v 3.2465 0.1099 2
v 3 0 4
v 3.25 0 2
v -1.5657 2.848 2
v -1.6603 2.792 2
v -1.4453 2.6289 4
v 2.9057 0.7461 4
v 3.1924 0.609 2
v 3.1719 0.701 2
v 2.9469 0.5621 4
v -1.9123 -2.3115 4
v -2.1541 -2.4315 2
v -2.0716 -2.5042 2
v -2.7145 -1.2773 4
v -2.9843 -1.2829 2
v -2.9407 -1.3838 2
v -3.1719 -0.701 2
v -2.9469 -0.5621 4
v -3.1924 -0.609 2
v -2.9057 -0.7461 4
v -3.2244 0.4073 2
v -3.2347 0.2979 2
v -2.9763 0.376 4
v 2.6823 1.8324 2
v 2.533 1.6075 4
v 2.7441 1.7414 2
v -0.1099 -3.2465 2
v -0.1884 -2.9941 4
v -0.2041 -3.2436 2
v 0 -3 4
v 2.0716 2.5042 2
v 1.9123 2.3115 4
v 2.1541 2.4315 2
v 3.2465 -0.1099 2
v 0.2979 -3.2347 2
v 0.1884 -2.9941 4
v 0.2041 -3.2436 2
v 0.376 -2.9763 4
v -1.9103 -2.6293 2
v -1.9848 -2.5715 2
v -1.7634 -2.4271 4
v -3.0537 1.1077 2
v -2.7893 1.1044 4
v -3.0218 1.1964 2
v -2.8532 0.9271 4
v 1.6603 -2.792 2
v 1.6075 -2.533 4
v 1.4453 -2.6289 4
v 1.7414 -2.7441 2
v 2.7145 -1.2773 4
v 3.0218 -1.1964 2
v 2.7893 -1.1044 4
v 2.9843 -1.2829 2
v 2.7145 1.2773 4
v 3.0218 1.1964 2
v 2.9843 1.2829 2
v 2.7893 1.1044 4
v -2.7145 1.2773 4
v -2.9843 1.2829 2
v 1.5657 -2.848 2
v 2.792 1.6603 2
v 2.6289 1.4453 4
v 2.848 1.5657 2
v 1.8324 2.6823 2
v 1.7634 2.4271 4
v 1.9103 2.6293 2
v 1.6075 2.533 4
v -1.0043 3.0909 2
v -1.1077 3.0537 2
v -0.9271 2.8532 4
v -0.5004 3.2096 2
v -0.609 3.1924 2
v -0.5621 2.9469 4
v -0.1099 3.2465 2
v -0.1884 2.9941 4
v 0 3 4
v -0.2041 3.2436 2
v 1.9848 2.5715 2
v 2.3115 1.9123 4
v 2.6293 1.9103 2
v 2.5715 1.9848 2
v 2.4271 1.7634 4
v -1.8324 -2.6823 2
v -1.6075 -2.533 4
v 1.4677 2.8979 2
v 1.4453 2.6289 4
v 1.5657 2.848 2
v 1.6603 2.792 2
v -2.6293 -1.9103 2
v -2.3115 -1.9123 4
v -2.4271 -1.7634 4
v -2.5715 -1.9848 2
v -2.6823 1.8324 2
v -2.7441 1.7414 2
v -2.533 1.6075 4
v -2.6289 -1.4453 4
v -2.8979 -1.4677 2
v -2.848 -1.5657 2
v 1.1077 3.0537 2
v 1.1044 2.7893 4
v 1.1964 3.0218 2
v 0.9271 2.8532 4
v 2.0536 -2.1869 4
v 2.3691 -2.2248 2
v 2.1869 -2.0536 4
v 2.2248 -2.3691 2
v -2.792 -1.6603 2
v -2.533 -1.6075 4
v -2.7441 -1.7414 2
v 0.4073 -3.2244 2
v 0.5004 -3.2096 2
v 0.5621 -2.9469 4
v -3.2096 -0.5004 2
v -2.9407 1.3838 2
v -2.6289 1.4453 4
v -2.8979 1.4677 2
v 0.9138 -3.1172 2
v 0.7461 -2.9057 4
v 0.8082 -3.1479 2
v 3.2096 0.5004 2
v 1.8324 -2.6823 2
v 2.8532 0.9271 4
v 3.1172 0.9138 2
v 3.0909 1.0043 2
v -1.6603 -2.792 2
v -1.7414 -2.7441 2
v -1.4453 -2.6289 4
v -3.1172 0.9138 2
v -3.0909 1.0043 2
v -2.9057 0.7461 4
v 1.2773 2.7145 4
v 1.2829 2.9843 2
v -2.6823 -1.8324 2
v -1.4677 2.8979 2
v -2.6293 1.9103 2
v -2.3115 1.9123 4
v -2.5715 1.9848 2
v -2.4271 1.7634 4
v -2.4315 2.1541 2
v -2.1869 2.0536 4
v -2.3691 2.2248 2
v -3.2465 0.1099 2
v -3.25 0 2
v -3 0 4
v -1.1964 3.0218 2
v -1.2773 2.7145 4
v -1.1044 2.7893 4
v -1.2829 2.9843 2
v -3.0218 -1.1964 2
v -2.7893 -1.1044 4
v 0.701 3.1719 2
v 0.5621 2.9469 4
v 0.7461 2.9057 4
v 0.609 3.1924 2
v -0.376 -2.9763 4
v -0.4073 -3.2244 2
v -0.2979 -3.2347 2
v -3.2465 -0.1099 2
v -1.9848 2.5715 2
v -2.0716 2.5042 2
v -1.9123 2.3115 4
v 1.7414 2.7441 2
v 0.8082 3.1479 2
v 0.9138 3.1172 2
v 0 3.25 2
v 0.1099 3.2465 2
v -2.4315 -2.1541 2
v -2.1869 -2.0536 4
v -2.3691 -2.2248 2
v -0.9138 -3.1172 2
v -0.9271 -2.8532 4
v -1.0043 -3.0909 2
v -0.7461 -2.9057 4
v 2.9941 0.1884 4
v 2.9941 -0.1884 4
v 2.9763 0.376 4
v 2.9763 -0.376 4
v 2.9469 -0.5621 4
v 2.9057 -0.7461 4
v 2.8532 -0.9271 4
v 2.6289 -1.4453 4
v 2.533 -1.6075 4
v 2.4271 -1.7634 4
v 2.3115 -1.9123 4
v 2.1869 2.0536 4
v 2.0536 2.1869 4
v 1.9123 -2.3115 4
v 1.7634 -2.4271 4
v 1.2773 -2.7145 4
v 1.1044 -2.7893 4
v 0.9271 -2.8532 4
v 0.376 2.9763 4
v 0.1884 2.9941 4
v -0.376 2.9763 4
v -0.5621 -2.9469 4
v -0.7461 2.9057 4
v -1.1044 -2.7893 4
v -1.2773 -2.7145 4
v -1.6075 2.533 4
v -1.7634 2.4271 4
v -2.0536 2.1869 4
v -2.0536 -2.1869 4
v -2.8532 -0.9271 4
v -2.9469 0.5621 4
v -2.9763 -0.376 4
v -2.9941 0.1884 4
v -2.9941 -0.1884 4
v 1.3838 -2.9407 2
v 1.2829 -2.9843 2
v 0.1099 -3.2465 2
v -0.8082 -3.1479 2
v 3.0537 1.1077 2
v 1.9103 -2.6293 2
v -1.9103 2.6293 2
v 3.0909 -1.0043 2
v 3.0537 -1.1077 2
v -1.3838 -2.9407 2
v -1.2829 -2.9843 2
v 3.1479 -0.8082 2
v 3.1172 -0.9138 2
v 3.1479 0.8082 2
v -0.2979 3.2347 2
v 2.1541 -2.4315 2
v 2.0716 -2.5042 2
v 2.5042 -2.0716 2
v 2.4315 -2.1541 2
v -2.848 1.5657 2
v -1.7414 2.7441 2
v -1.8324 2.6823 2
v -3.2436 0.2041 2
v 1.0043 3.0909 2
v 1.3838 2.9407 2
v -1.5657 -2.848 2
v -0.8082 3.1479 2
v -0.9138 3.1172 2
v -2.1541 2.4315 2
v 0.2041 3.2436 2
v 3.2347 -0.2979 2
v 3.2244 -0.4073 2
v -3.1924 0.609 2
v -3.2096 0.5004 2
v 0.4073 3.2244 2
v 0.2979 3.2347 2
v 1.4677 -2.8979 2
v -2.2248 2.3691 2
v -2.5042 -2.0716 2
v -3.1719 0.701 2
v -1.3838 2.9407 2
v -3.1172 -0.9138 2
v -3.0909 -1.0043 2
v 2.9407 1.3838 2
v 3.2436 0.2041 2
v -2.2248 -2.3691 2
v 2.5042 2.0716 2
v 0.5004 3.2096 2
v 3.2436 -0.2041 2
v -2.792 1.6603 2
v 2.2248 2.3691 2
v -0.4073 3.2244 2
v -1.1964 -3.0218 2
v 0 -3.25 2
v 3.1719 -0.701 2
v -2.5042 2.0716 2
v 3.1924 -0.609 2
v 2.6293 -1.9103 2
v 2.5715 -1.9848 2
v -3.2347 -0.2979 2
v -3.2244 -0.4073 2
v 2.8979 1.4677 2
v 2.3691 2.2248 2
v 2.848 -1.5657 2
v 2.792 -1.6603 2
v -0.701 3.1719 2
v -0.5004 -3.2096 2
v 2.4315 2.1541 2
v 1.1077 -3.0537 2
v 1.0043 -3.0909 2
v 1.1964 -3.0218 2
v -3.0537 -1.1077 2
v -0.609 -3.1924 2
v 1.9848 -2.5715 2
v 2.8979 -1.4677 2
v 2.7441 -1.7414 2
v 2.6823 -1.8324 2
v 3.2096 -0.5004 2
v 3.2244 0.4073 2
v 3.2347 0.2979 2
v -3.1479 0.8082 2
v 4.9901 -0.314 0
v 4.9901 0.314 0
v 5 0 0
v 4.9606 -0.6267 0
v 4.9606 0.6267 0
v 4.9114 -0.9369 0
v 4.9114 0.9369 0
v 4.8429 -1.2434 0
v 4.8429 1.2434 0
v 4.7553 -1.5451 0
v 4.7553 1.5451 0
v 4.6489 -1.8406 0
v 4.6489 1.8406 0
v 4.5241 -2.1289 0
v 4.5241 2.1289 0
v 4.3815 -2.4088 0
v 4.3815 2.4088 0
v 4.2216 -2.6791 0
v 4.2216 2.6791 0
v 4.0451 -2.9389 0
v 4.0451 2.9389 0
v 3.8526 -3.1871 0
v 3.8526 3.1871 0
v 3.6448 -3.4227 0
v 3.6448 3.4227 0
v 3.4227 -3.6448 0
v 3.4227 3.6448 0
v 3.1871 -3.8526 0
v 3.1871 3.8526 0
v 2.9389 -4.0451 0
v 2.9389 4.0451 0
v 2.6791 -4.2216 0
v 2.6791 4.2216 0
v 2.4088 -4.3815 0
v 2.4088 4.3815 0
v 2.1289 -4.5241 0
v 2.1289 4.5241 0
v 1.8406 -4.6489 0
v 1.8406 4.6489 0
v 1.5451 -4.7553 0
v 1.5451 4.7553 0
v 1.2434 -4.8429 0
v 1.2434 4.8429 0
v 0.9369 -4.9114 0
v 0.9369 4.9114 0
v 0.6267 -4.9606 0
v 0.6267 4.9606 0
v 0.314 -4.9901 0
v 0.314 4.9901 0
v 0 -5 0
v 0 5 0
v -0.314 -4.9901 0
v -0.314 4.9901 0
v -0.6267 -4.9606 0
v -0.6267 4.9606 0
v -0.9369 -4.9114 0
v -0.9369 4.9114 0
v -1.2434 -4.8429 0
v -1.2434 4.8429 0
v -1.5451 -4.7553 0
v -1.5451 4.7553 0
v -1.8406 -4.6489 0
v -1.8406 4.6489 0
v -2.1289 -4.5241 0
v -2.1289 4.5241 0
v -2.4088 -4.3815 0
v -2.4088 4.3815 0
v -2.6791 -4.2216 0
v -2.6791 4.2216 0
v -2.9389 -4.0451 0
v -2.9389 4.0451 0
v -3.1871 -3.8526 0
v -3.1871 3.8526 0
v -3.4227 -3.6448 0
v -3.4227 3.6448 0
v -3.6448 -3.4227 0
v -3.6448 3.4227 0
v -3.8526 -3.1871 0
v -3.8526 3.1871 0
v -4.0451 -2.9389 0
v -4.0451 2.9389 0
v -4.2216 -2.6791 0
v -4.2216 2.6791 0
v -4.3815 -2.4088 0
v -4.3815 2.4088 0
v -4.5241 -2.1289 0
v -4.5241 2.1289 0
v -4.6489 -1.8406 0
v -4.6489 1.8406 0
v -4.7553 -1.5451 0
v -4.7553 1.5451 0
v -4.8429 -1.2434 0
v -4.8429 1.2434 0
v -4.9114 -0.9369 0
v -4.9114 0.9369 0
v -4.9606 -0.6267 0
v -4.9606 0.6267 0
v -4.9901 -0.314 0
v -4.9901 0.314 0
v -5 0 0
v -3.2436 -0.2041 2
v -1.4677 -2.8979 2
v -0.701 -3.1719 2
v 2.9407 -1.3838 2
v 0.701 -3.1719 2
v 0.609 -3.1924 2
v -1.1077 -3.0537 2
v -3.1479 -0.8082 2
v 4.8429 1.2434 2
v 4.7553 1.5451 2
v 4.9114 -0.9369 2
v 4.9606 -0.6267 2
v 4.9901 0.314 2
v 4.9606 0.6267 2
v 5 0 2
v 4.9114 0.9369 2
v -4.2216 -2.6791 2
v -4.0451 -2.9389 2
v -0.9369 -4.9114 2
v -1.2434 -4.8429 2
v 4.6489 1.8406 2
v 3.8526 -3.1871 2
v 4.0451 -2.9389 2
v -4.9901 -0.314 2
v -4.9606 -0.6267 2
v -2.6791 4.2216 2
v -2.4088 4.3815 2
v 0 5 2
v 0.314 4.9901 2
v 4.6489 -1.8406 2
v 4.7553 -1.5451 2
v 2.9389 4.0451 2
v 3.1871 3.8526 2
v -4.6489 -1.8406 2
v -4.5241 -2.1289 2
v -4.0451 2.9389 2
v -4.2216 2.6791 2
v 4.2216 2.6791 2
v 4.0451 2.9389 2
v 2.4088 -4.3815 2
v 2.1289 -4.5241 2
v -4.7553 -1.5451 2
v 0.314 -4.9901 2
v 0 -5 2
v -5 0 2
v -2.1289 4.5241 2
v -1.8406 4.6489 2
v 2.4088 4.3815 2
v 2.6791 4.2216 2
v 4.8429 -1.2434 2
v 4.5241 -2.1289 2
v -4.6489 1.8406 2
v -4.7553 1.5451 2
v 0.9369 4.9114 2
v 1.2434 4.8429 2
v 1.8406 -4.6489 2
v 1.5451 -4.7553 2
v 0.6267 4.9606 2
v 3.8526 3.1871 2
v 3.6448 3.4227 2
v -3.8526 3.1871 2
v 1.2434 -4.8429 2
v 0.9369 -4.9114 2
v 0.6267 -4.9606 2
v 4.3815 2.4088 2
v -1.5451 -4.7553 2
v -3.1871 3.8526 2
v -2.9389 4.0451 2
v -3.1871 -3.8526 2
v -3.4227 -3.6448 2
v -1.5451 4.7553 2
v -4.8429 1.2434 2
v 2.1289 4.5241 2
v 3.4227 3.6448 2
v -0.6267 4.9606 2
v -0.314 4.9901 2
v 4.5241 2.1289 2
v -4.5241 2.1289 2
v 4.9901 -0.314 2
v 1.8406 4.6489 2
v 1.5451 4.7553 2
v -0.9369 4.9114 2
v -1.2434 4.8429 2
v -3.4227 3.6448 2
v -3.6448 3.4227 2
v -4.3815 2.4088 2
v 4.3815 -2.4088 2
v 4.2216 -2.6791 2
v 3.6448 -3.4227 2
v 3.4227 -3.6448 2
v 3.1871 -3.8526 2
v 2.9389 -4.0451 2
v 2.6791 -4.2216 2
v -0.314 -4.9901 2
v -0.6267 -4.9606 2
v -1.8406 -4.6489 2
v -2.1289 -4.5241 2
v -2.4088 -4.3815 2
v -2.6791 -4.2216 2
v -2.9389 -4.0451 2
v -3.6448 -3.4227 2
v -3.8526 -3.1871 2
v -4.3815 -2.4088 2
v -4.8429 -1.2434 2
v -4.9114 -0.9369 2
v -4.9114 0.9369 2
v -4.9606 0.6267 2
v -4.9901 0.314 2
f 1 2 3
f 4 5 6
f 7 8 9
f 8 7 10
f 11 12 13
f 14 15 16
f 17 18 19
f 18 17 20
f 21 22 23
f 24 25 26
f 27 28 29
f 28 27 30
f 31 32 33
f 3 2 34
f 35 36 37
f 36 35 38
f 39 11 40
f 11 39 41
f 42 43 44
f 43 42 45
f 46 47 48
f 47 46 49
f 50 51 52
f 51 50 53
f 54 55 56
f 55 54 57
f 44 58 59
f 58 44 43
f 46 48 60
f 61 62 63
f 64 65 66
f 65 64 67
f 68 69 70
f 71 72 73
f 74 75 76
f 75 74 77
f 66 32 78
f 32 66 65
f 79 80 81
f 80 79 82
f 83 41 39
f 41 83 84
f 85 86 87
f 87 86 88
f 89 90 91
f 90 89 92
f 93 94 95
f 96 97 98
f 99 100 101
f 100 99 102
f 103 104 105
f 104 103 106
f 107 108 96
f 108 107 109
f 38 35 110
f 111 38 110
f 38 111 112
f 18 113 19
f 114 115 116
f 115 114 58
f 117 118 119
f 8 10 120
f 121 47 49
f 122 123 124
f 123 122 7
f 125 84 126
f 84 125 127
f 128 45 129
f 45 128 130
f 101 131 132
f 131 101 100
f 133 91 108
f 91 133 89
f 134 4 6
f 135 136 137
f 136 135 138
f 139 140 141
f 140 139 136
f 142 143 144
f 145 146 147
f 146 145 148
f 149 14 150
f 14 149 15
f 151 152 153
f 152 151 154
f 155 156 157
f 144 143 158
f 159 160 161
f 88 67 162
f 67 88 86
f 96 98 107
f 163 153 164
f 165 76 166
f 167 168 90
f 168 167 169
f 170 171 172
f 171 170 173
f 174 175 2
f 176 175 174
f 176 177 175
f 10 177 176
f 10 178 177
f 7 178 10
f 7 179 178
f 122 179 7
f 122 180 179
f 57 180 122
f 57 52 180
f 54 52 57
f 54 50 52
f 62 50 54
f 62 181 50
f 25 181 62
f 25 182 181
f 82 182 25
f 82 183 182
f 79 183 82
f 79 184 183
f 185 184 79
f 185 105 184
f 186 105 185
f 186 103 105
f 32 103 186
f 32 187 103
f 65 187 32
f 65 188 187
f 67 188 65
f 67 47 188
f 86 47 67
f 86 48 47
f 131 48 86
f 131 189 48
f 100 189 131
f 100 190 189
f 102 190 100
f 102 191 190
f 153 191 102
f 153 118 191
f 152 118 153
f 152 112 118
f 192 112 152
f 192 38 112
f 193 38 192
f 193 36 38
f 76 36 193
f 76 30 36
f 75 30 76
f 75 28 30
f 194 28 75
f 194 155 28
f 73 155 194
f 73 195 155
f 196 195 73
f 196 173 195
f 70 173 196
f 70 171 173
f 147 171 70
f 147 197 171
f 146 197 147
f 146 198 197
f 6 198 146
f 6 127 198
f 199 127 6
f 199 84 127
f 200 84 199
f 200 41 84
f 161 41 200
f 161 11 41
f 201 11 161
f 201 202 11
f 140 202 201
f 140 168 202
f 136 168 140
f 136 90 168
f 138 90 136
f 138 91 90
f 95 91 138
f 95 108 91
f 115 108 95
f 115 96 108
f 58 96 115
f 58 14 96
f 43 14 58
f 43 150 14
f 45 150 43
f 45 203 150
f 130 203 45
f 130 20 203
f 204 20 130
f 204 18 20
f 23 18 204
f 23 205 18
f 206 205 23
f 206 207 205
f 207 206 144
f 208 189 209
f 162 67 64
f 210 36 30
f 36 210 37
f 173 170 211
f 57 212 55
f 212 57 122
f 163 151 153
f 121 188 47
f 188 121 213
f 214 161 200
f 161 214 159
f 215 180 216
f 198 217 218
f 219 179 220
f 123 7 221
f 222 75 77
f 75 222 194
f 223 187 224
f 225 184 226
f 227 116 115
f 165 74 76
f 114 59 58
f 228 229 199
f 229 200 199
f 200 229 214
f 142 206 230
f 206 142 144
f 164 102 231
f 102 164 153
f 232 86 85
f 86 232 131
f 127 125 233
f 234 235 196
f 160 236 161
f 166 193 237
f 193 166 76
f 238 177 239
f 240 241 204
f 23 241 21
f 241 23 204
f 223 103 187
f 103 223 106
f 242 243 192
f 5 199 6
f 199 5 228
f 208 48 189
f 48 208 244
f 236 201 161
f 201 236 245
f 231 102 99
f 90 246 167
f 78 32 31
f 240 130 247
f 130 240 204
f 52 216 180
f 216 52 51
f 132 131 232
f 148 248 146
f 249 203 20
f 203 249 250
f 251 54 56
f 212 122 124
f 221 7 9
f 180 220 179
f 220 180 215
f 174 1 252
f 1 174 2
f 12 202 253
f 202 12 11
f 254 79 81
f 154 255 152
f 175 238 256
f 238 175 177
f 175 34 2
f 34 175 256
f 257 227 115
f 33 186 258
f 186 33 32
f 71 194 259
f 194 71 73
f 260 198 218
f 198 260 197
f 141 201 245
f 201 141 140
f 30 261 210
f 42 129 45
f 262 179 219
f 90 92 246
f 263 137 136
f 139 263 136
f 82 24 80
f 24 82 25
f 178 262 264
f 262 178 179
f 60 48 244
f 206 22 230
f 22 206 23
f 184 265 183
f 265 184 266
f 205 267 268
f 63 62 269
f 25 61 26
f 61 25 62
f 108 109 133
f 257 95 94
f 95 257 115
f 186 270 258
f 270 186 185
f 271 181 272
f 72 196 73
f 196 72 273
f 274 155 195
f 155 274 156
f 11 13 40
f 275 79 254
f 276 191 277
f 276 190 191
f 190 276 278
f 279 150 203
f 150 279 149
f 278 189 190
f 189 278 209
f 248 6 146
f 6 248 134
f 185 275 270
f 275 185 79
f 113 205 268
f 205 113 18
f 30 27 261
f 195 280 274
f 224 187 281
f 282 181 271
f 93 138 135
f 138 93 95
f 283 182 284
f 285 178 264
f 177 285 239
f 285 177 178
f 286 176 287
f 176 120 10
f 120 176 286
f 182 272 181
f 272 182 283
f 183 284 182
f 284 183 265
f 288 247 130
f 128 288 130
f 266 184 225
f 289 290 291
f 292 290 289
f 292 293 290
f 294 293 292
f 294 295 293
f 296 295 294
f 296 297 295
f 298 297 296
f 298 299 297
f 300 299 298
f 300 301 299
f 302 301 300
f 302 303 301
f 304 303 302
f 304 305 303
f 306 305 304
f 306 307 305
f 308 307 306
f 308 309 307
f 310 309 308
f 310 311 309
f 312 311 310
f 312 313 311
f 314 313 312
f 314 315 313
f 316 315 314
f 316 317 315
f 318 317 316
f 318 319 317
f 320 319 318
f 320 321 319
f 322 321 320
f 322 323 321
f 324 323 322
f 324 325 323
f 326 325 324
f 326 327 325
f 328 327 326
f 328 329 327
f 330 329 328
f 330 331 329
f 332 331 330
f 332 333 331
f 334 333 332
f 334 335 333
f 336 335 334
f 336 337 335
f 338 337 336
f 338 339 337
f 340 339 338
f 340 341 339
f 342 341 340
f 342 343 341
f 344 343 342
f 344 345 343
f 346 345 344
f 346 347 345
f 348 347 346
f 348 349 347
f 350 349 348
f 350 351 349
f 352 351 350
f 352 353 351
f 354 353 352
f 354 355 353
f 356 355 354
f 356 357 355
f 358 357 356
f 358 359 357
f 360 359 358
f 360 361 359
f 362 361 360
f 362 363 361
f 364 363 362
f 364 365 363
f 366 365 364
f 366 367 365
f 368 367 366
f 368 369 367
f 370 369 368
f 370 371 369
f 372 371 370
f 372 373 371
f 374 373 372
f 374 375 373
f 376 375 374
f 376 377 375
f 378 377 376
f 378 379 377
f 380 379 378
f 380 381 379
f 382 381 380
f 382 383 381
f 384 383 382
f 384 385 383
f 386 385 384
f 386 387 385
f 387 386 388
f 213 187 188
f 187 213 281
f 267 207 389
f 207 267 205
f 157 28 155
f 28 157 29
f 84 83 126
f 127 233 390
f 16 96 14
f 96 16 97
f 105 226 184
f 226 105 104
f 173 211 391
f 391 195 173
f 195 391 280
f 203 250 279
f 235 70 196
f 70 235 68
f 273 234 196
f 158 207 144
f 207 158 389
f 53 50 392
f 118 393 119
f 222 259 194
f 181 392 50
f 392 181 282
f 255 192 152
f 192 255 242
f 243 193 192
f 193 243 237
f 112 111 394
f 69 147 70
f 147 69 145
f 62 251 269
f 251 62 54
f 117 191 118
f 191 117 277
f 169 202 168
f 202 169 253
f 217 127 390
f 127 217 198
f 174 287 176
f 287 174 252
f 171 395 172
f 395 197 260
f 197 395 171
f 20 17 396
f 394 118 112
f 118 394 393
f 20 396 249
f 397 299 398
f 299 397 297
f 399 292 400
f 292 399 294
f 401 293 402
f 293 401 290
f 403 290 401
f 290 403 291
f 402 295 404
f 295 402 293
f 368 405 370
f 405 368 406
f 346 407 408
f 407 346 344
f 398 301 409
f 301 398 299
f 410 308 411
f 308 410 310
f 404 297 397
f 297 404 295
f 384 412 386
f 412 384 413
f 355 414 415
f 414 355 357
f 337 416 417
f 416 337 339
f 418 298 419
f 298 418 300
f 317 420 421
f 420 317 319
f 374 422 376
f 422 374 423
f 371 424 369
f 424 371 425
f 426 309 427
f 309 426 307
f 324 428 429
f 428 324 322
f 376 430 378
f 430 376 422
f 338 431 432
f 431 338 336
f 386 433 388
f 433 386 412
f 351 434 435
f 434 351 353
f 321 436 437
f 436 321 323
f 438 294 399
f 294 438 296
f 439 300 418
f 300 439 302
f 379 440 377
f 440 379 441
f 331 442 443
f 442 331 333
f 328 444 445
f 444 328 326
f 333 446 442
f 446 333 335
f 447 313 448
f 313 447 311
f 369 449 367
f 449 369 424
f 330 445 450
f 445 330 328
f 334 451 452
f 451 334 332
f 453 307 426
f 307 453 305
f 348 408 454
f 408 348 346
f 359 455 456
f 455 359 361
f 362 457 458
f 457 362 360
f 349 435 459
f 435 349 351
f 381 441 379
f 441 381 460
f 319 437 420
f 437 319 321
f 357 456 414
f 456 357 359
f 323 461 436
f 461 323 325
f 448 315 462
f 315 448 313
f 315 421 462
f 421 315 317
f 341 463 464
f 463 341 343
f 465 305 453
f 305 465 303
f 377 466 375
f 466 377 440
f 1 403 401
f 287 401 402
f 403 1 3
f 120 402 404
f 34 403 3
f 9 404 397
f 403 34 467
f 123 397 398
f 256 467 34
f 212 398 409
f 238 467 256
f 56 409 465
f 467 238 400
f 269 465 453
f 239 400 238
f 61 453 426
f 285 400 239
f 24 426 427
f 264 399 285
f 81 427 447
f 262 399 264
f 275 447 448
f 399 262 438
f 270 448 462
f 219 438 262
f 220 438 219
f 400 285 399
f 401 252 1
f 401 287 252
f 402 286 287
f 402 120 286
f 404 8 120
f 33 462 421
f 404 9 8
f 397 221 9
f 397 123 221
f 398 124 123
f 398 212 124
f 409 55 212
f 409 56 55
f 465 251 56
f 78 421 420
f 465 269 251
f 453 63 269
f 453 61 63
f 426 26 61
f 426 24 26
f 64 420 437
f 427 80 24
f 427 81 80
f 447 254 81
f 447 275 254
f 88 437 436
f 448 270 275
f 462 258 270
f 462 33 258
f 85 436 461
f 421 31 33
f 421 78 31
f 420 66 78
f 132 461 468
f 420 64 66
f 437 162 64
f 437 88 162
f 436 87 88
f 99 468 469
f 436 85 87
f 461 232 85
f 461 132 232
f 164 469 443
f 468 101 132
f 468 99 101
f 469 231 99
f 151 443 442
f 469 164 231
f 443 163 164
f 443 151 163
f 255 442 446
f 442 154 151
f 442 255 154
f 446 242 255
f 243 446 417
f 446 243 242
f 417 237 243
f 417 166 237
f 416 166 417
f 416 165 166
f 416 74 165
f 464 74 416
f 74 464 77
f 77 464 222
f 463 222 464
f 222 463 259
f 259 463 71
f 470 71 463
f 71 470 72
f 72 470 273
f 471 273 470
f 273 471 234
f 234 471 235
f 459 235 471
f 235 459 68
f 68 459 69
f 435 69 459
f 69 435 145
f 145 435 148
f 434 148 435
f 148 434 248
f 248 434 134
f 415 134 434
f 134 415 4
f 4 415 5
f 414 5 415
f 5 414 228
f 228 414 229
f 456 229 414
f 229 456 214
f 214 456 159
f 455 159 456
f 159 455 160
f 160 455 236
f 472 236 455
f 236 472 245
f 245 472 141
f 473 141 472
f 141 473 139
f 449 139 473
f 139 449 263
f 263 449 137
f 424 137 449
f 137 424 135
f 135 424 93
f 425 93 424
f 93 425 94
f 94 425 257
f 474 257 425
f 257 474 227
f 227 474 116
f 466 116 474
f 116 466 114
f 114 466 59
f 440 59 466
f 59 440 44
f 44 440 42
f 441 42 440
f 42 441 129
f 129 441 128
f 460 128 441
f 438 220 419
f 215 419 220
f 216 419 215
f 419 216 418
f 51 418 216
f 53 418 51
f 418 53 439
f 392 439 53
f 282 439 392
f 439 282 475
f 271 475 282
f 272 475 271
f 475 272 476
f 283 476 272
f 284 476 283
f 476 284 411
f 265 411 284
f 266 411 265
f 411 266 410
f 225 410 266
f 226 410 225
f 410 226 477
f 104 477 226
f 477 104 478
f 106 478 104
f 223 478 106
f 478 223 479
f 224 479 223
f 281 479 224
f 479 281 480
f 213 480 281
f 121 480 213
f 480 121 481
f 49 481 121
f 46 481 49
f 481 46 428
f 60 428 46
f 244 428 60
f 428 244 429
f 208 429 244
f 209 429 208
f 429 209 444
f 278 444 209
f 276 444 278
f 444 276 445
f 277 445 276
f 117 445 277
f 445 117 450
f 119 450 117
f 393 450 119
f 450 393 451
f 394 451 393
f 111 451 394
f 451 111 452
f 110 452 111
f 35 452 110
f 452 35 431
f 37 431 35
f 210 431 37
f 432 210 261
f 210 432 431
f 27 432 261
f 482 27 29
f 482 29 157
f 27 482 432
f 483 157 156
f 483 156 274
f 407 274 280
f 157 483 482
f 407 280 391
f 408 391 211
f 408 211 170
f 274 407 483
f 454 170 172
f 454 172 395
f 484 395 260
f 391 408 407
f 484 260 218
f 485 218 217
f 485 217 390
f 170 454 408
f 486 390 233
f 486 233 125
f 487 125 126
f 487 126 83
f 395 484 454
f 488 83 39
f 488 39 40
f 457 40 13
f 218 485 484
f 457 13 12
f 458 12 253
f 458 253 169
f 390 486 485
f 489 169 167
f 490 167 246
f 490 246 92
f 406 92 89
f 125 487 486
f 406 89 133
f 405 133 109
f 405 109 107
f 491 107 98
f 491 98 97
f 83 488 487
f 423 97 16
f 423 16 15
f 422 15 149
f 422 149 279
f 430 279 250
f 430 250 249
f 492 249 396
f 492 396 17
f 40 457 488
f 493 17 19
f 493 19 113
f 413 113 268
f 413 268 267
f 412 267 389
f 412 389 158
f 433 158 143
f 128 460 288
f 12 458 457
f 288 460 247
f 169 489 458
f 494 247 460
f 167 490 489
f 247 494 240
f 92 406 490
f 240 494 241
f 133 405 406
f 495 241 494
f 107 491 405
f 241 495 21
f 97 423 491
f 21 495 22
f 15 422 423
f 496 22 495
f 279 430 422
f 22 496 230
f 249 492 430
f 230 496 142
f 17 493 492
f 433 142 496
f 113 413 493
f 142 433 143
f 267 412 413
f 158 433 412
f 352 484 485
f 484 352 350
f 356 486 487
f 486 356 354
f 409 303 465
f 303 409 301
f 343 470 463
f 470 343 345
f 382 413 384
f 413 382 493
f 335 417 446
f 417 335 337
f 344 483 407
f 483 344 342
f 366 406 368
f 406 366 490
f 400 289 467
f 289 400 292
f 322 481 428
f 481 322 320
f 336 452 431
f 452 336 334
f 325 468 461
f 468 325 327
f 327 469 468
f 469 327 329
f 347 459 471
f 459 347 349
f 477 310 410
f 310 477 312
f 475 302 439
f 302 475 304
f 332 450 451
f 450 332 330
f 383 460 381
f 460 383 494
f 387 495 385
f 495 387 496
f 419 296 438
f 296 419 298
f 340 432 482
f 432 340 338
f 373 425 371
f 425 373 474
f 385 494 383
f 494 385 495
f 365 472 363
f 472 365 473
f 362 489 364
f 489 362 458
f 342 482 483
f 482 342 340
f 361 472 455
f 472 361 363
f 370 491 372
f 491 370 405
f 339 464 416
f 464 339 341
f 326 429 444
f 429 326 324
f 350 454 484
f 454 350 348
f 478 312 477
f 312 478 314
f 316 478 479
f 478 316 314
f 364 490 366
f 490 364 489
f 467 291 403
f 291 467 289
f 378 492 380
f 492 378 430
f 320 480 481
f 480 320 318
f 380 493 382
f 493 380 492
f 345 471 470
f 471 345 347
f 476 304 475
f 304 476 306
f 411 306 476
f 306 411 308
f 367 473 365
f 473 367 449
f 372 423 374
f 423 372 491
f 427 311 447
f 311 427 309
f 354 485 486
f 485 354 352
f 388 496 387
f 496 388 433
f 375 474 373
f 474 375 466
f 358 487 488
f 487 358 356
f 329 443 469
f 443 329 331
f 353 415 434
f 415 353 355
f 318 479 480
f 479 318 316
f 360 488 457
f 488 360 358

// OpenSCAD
border_to_hole = 4;
hole_distance_x = 78;
hole_distance_y = 42;
pcb_x = 2*border_to_hole + hole_distance_x;
pcb_y = 2*border_to_hole + hole_distance_y;
box_x = pcb_x + 10;
box_y = pcb_y + 10;
offset_pcb_x = (box_x - pcb_x) / 2;
offset_pcb_y = (box_y - pcb_y) / 2;
box_bottom_thickness = 2;
box_wall_thickness = 2;
box_height = 20;
hole_outer_diammeter = 6;
hole_bottom_diammeter = 16;
hole_inner_diammeter= 2.75;
hole_z = box_bottom_thickness + 12;
screen_cutout_offset_x = 15.5;
screen_cutout_offset_y = 6.5;
screen_cutout_x = 59;
screen_cutout_y = 46;

// Caja extendida para meter los conectores USB y de alimentación
box_extended_x = box_x + 40;
box_extended_y = box_y;
wire_cutout_diammeter = 16;
wire_cutout_offset_x = box_extended_x - box_wall_thickness - wire_cutout_diammeter/2 - 5;
wire_cutout_offset_y = box_wall_thickness + wire_cutout_diammeter/2 + 5;

// base
base_outer_diameter = 10;
base_height_increment = 10;;
base_width = box_extended_x  / 4;


module hole(){
    difference() {
        union() {
            cylinder(h = hole_z, d = hole_outer_diammeter, $fn = 100);
            cylinder(h = hole_z - 3, d1 = hole_bottom_diammeter, d2 = hole_outer_diammeter, $fn = 100);
        }
        translate([0,0,0.001]) cylinder(h = hole_z + 0.001, d = hole_inner_diammeter, $fn = 100);
    }
}

module box_holes(){
    for (x = [border_to_hole, border_to_hole + hole_distance_x]){
        for (y = [border_to_hole, border_to_hole + hole_distance_y]){
            translate([x + offset_pcb_x, y + offset_pcb_y, 0]) hole();
        }
    }
}

module box_with_reset(){
    difference() {
        union () {
            difference() {
                cube([box_x, box_y, box_height]);
                translate([box_wall_thickness, box_wall_thickness, box_bottom_thickness]) cube([box_x - 2*box_wall_thickness, box_y - 2*box_wall_thickness, box_height]);
                translate([box_x - box_wall_thickness - 0.001, box_wall_thickness + 20/2, box_bottom_thickness + 5]) cube([box_wall_thickness + 0.002, box_y - 2*box_wall_thickness - 20, box_height]);
            }
            box_holes();
        }
        // Agujero para el reset. Se puede quitar en el diseño final
        translate([offset_pcb_x + 11, offset_pcb_y + pcb_y - 6, -0.001]) cylinder(h = box_height + 0.002, d = 8, $fn = 100);
    }
}

module box(){
    union () {
        difference() {
            cube([box_x, box_y, box_height]);
            translate([box_wall_thickness, box_wall_thickness, box_bottom_thickness]) cube([box_x - 2*box_wall_thickness, box_y - 2*box_wall_thickness, box_height]);
            translate([box_x - box_wall_thickness - 0.001, box_wall_thickness + 20/2, box_bottom_thickness + 5]) cube([box_wall_thickness + 0.002, box_y - 2*box_wall_thickness - 20, box_height]);
        }
        box_holes();
    }
}


module cover(){
    difference() {
        cube([box_x + box_wall_thickness, box_y + 2 * box_wall_thickness, box_height + 2 * box_bottom_thickness]);
        // Le damos una holgura al cover para que entre sin problemas
        translate([box_wall_thickness, box_wall_thickness - 0.5/2, box_bottom_thickness - 0.5/2]) cube([box_x + 0.001, box_y + 0.5, box_height + 0.5]);
        translate([screen_cutout_offset_x + box_wall_thickness, screen_cutout_offset_y + box_wall_thickness, 3*box_bottom_thickness]) cube([screen_cutout_x, screen_cutout_y, box_height]);
    }
}

module box_extended(){
    union () {
        difference() {
            cube([box_extended_x, box_extended_y, box_height]);
            translate([box_wall_thickness, box_wall_thickness, box_bottom_thickness]) cube([box_extended_x - 2*box_wall_thickness, box_extended_y - 2*box_wall_thickness, box_height]);

        }
        for (x = [border_to_hole, border_to_hole + hole_distance_x]){
            for (y = [border_to_hole, border_to_hole + hole_distance_y]){
                translate([x + offset_pcb_x, y + offset_pcb_y, 0]) hole();
            }
        }
    }
}

module box_extended_with_wire_hole(){
    union () {
        difference() {
            cube([box_extended_x, box_extended_y, box_height]);
            translate([box_wall_thickness, box_wall_thickness, box_bottom_thickness]) cube([box_extended_x - 2*box_wall_thickness, box_extended_y - 2*box_wall_thickness, box_height]);
            translate([wire_cutout_offset_x, wire_cutout_offset_y, -0.001]) cylinder(h = box_bottom_thickness + 0.002, d = wire_cutout_diammeter, $fn = 100);

        }
        for (x = [border_to_hole, border_to_hole + hole_distance_x]){
            for (y = [border_to_hole, border_to_hole + hole_distance_y]){
                translate([x + offset_pcb_x, y + offset_pcb_y, 0]) hole();
            }
        }
    }
}

module box_extended_outline(){
    cube([box_extended_x, box_extended_y, box_height]);
}


module base1() {
    difference() {
        union() {
            difference(){
                translate([box_extended_x/2 + base_outer_diameter/2, 0, 0]) sphere(d = box_extended_x, $fn = 100);
                translate([box_extended_x/2 + base_outer_diameter/2 + 0.001, 0, -box_extended_x/2 - 0.001]) cylinder(h = box_extended_x/2 + 0.001, d = box_extended_x + 0.002, $fn = 100);
                rotate([60,0,0]) translate([box_extended_x/2 + base_outer_diameter/2 + 0.001, 0, 0]) cylinder(h = box_extended_x/2 + 0.001, d = box_extended_x + 0.002, $fn = 100);
            }
            rotate([60,0,0]) translate([base_outer_diameter/2, base_outer_diameter/2, 0]) {
                // Display
                difference() {
                    minkowski() {
                        box_extended_outline();
                        cylinder(h = base_height_increment, d = base_outer_diameter, $fn = 100);
                    }
                    translate([0,0,base_height_increment + 0.001]) box_extended_outline();
                }
                translate([0,0,base_height_increment]) box_extended();
            }
        }
        translate([0,0,40]) rotate([60,0,0]) translate([box_extended_x/2 + base_outer_diameter/2,0,0]) cylinder(h = 200, d = wire_cutout_diammeter, $fn = 200, center = true);
    }
}


module base2(){
    difference() {
        union() {
            hull() {
                rotate([150,0,0]) translate([(base_outer_diameter + box_extended_x - box_extended_x / 2)/2,  0, 0]) {
                    cube([box_extended_x / 2, box_height + base_height_increment, 0.001]);
                }
                translate([(base_outer_diameter + box_extended_x - base_width)/2, -(box_height + base_height_increment) * cos(30), -0.001]) cube([base_width, (box_height + base_height_increment) * cos(30), 0.001]);
            }
            hull() {
                rotate([60,0,0]) translate([base_outer_diameter/2, base_outer_diameter/2, 0]) {                    
                    minkowski() {
                        cube([box_extended_x, box_extended_y, 0.001]);
                        cylinder(h = 0.001, d = base_outer_diameter, $fn = 100);
                    }
                }
                translate([(base_outer_diameter + box_extended_x - base_width)/2,0,-0.001]) cube([base_width, (box_extended_y + base_outer_diameter) * cos(60), 0.001]);
            }
            rotate([60,0,0]) translate([base_outer_diameter/2, base_outer_diameter/2, 0]) {
                // Display
                difference() {
                    minkowski() {
                        box_extended_outline();
                        cylinder(h = base_height_increment, d = base_outer_diameter, $fn = 100);
                    }
                    translate([0,0,base_height_increment + 0.001]) box_extended_outline();
                }
                translate([0,0,base_height_increment]) box_extended();
            }
        }
        translate([0,0,40]) rotate([60,0,0]) translate([box_extended_x/2 + base_outer_diameter/2,0,0]) cylinder(h = 200, d = wire_cutout_diammeter, $fn = 200, center = true);
        // Agujero para el conector de antena
        translate([box_extended_x - box_wall_thickness + base_outer_diameter/2 - 0.001, -10, 20]) rotate([0,90,0]) 
          cylinder(h = box_wall_thickness + base_outer_diameter / 2 - 2, d = 12, $fn = 200, center = false);
        translate([box_extended_x - box_wall_thickness + base_outer_diameter/2 - 0.001, -10, 20]) rotate([0,90,0]) 
          cylinder(h = box_wall_thickness + base_outer_diameter / 2 + 0.002, d = 6.5, $fn = 200, center = false);
    }
}


module cover2(){
    difference() {
         minkowski() {
            cube([box_extended_x, box_extended_y, 1.2]);
            cylinder(h = 0.001, d = base_outer_diameter, $fn = 100);
        }
        translate([screen_cutout_offset_x, screen_cutout_offset_y, -0.001]) cube([screen_cutout_x, screen_cutout_y, 5]);
    }
    translate([box_wall_thickness + 0.2, box_wall_thickness + 0.2, -3]) difference() {
        cube([box_extended_x - 2 * box_wall_thickness - 0.4, box_extended_y - 2 * box_wall_thickness - 0.4, 3]);
        translate([1,1,-0.001]) cube([box_extended_x - 2 * box_wall_thickness - 0.4 - 2, box_extended_y - 2 * box_wall_thickness - 0.4 - 2, 3 + 0.002]);
    }
}

module tapon() {
    cylinder(h = 4, d1 = 7, d2 = 6.5 - 0.5, $fn = 100);
    cylinder(h = 2, d = 10, $fn = 100);
}


//cover2();
// box_extended();
// cover();
//base2();
tapon();
